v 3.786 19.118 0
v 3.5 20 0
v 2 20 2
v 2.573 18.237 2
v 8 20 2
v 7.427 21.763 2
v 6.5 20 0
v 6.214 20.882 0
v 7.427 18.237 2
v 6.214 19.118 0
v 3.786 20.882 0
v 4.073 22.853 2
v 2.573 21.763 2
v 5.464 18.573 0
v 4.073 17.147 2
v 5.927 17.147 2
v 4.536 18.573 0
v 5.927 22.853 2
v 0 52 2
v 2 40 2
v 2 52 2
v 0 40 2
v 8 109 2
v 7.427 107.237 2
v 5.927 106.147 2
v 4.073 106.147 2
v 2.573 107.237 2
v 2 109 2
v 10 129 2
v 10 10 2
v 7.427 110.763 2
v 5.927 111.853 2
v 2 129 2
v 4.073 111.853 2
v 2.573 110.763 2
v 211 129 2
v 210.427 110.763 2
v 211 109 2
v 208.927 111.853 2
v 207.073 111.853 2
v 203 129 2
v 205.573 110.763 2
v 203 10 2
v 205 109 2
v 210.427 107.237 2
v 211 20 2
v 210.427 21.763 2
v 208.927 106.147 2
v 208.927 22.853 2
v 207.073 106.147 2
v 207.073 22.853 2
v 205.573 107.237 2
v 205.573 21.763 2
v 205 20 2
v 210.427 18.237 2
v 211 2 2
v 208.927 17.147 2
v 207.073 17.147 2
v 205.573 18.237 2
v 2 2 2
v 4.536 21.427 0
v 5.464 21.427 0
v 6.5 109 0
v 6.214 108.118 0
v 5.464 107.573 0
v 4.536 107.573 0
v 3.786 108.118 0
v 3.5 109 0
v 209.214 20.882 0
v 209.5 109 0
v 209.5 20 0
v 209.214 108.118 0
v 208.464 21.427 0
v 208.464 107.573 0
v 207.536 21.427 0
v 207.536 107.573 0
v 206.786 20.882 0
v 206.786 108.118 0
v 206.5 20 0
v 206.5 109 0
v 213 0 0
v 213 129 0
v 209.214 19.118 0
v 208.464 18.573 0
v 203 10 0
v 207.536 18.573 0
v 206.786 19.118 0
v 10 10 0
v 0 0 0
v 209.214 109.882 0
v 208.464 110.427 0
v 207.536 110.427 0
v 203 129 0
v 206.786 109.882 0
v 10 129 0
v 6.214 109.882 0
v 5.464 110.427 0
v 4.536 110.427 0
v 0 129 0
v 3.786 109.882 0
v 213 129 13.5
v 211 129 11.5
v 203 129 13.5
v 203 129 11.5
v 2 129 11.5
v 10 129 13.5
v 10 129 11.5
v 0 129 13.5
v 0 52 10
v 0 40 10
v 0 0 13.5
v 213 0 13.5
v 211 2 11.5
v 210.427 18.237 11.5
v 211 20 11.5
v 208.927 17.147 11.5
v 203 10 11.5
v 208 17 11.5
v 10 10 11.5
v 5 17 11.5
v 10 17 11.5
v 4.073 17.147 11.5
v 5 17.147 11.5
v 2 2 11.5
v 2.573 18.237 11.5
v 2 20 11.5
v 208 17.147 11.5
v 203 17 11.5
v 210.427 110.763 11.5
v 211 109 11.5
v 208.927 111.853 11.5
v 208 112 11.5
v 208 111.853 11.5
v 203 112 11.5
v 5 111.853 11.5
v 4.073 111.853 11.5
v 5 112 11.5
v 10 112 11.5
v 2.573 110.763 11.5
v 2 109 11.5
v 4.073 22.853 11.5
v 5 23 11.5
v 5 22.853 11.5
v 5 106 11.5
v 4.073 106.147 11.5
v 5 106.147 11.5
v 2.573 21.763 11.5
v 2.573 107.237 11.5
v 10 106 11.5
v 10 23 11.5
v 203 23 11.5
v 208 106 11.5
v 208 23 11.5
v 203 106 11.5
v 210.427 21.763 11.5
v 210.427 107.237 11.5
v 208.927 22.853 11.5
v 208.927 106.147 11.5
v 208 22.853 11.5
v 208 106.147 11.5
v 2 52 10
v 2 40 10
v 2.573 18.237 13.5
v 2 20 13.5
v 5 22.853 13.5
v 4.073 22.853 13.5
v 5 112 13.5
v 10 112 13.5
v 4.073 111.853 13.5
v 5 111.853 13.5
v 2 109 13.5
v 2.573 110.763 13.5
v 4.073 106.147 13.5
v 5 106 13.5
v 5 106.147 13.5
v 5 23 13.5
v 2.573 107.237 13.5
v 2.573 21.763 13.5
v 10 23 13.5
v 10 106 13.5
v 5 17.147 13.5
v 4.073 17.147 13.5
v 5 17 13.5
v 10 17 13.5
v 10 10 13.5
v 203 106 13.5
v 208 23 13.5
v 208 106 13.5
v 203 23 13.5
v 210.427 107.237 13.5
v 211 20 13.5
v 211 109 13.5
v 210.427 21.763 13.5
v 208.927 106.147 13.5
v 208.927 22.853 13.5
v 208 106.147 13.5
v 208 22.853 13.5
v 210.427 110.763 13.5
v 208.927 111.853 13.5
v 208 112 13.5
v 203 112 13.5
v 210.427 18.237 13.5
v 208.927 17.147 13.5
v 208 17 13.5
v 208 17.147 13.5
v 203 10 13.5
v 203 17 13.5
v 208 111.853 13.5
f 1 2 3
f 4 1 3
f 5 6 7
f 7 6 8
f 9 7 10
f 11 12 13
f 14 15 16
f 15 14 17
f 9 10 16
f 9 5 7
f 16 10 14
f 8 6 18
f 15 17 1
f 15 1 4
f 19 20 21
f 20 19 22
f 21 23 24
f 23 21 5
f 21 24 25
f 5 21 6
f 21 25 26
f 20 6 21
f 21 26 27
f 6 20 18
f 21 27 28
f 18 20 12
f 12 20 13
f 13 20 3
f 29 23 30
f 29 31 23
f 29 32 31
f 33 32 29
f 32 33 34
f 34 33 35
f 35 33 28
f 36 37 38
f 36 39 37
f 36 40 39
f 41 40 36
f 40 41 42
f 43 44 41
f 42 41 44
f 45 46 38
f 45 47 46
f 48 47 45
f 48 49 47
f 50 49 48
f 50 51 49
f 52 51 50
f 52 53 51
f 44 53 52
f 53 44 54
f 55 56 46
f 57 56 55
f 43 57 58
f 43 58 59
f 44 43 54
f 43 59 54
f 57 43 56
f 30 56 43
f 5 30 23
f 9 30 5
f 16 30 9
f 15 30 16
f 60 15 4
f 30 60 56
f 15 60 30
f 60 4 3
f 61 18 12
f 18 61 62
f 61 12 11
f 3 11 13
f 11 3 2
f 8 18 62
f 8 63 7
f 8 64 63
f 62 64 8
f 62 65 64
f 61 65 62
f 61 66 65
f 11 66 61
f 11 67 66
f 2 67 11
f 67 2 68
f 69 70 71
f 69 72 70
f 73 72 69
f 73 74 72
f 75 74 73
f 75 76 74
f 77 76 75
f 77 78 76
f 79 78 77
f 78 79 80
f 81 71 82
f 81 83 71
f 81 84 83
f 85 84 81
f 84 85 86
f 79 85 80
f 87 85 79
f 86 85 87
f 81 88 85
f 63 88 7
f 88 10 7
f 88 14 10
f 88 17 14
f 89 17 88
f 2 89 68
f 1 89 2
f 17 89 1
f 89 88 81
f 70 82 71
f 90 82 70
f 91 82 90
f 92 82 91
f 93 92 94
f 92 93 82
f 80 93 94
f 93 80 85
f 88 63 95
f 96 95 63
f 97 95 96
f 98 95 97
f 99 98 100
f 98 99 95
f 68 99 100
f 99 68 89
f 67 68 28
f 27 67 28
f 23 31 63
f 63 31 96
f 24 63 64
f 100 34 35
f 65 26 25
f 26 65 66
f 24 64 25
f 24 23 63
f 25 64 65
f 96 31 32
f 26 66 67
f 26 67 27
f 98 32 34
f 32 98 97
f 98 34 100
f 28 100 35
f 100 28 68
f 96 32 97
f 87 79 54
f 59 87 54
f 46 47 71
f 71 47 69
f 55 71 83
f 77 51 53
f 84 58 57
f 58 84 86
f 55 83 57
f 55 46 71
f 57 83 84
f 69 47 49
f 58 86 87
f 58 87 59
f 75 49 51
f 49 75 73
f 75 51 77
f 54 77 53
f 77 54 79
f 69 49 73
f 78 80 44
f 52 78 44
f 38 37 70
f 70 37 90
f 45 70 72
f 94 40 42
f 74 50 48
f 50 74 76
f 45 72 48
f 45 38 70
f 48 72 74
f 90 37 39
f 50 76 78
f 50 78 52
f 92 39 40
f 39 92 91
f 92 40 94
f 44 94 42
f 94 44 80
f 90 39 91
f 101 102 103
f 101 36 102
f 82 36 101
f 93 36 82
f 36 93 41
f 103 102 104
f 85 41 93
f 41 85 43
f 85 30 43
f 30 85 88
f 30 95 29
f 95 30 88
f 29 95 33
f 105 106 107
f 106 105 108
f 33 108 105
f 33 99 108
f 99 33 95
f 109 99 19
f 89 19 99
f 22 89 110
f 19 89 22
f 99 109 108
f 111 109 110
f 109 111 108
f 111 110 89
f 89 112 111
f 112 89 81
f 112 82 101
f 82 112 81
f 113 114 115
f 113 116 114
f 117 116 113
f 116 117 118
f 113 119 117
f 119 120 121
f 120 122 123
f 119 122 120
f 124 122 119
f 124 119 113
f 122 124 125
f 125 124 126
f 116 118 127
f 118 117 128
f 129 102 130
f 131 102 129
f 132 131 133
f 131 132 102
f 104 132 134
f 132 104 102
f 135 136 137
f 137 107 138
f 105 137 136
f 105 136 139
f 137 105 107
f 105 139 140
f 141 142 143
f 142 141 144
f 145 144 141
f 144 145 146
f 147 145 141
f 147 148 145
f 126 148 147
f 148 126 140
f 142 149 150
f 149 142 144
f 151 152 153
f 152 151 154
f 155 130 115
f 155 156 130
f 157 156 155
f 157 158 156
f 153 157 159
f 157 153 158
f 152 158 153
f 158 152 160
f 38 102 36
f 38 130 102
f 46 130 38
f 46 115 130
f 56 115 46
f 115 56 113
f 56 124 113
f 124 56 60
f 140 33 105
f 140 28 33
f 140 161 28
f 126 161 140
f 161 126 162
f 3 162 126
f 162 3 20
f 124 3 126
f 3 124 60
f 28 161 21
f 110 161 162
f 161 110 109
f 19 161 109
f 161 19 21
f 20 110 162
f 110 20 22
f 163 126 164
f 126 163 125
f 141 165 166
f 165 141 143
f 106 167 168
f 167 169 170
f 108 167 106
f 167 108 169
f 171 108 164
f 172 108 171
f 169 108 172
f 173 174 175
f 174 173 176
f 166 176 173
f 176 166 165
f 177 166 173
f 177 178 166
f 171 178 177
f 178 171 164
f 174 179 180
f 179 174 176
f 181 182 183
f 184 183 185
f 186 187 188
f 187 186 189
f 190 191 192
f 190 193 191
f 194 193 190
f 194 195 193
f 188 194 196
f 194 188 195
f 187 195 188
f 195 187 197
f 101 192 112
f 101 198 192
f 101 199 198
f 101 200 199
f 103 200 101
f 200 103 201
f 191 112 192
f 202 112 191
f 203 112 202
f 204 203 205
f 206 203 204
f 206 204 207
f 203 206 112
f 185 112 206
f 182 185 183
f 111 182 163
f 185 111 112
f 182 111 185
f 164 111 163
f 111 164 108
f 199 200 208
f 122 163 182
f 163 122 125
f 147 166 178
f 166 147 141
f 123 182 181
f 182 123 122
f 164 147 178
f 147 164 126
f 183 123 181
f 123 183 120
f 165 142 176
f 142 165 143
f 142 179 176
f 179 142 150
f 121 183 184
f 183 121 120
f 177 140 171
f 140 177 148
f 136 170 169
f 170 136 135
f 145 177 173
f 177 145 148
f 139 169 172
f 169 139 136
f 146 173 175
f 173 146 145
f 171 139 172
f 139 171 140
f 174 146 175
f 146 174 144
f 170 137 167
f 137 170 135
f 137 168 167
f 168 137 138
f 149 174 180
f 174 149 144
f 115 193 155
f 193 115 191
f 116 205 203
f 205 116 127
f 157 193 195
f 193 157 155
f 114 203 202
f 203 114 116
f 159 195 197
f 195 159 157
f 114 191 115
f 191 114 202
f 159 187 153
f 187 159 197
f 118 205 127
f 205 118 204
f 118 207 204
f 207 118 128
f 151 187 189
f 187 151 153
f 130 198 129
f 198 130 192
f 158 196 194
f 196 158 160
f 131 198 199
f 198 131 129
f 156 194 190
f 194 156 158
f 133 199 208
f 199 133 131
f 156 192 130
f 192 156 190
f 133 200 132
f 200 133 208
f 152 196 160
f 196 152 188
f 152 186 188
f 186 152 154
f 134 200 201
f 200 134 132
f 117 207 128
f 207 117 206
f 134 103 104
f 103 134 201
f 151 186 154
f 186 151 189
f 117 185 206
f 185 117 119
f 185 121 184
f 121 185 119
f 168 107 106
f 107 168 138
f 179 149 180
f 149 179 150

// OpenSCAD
sirkaTabletu = 203; //209mm + steny - 10mm co nevim kde se vzaly
vyskaTabletu = 129; //127mm + stena
tloustkaTabletu = 9.5;
tloustkaSten = 2;
sirkaDrzaku = 10;

//	
//	⚠️ This is where the clean code ends. ⚠️
//
//	Explore on your own risk.
//

module base(){
	linear_extrude(tloustkaSten){
		square([sirkaDrzaku, vyskaTabletu]);
		square([sirkaTabletu, sirkaDrzaku]);
		translate([sirkaTabletu, 0, 0])square([sirkaDrzaku,vyskaTabletu]);
	}
};

module baseBrace(){
	hull(){
		translate([0, vyskaTabletu - sirkaDrzaku, 0]) square(sirkaDrzaku);
		translate([sirkaTabletu, 0, 0]) square(sirkaDrzaku);
	}
	hull(){
		translate([0, 0, 0]) square(sirkaDrzaku);
		translate([sirkaTabletu, vyskaTabletu - sirkaDrzaku, 0]) square(sirkaDrzaku);
	}
}

module walls(){
	linear_extrude(tloustkaTabletu + tloustkaSten){
		square([tloustkaSten, vyskaTabletu]);
		square([sirkaTabletu + sirkaDrzaku, tloustkaSten]);
		translate([sirkaTabletu + sirkaDrzaku - tloustkaSten, 0, 0])square([tloustkaSten, vyskaTabletu]);
	}
};

module screwHoles(){
	translate([sirkaDrzaku/2, 20]) cylinder(tloustkaSten, 1.5, 3);
	translate([sirkaDrzaku/2, vyskaTabletu - 20]) cylinder(tloustkaSten, 1.5, 3);
}

module singleUpperHole(){
	cylinder(tloustkaSten, 3, 3);
	translate([3, 0, 0]) cube([6, 6, 10], center = true);
}

module upperHoles(){
	translate([sirkaDrzaku/2, 20, tloustkaTabletu + tloustkaSten]) singleUpperHole();
	translate([sirkaDrzaku/2, vyskaTabletu - 20, tloustkaTabletu + tloustkaSten]) singleUpperHole();
	
	translate([sirkaDrzaku/2 + sirkaTabletu, 20, tloustkaTabletu + tloustkaSten]) rotate([0, 0, 180]) singleUpperHole();
	translate([sirkaDrzaku/2 + sirkaTabletu, vyskaTabletu - 20, tloustkaTabletu + tloustkaSten]) rotate([0, 0, 180]) singleUpperHole();
}

// ======================= body =======================

difference(){
	base();
	screwHoles();
	translate([sirkaTabletu, 0, 0])screwHoles();
}

difference(){
	walls();
	translate([-1, 40, tloustkaSten]) cube([4,12,8]);
}

difference(){
	translate([0, 0, tloustkaTabletu + tloustkaSten]) base();
	upperHoles();
};
